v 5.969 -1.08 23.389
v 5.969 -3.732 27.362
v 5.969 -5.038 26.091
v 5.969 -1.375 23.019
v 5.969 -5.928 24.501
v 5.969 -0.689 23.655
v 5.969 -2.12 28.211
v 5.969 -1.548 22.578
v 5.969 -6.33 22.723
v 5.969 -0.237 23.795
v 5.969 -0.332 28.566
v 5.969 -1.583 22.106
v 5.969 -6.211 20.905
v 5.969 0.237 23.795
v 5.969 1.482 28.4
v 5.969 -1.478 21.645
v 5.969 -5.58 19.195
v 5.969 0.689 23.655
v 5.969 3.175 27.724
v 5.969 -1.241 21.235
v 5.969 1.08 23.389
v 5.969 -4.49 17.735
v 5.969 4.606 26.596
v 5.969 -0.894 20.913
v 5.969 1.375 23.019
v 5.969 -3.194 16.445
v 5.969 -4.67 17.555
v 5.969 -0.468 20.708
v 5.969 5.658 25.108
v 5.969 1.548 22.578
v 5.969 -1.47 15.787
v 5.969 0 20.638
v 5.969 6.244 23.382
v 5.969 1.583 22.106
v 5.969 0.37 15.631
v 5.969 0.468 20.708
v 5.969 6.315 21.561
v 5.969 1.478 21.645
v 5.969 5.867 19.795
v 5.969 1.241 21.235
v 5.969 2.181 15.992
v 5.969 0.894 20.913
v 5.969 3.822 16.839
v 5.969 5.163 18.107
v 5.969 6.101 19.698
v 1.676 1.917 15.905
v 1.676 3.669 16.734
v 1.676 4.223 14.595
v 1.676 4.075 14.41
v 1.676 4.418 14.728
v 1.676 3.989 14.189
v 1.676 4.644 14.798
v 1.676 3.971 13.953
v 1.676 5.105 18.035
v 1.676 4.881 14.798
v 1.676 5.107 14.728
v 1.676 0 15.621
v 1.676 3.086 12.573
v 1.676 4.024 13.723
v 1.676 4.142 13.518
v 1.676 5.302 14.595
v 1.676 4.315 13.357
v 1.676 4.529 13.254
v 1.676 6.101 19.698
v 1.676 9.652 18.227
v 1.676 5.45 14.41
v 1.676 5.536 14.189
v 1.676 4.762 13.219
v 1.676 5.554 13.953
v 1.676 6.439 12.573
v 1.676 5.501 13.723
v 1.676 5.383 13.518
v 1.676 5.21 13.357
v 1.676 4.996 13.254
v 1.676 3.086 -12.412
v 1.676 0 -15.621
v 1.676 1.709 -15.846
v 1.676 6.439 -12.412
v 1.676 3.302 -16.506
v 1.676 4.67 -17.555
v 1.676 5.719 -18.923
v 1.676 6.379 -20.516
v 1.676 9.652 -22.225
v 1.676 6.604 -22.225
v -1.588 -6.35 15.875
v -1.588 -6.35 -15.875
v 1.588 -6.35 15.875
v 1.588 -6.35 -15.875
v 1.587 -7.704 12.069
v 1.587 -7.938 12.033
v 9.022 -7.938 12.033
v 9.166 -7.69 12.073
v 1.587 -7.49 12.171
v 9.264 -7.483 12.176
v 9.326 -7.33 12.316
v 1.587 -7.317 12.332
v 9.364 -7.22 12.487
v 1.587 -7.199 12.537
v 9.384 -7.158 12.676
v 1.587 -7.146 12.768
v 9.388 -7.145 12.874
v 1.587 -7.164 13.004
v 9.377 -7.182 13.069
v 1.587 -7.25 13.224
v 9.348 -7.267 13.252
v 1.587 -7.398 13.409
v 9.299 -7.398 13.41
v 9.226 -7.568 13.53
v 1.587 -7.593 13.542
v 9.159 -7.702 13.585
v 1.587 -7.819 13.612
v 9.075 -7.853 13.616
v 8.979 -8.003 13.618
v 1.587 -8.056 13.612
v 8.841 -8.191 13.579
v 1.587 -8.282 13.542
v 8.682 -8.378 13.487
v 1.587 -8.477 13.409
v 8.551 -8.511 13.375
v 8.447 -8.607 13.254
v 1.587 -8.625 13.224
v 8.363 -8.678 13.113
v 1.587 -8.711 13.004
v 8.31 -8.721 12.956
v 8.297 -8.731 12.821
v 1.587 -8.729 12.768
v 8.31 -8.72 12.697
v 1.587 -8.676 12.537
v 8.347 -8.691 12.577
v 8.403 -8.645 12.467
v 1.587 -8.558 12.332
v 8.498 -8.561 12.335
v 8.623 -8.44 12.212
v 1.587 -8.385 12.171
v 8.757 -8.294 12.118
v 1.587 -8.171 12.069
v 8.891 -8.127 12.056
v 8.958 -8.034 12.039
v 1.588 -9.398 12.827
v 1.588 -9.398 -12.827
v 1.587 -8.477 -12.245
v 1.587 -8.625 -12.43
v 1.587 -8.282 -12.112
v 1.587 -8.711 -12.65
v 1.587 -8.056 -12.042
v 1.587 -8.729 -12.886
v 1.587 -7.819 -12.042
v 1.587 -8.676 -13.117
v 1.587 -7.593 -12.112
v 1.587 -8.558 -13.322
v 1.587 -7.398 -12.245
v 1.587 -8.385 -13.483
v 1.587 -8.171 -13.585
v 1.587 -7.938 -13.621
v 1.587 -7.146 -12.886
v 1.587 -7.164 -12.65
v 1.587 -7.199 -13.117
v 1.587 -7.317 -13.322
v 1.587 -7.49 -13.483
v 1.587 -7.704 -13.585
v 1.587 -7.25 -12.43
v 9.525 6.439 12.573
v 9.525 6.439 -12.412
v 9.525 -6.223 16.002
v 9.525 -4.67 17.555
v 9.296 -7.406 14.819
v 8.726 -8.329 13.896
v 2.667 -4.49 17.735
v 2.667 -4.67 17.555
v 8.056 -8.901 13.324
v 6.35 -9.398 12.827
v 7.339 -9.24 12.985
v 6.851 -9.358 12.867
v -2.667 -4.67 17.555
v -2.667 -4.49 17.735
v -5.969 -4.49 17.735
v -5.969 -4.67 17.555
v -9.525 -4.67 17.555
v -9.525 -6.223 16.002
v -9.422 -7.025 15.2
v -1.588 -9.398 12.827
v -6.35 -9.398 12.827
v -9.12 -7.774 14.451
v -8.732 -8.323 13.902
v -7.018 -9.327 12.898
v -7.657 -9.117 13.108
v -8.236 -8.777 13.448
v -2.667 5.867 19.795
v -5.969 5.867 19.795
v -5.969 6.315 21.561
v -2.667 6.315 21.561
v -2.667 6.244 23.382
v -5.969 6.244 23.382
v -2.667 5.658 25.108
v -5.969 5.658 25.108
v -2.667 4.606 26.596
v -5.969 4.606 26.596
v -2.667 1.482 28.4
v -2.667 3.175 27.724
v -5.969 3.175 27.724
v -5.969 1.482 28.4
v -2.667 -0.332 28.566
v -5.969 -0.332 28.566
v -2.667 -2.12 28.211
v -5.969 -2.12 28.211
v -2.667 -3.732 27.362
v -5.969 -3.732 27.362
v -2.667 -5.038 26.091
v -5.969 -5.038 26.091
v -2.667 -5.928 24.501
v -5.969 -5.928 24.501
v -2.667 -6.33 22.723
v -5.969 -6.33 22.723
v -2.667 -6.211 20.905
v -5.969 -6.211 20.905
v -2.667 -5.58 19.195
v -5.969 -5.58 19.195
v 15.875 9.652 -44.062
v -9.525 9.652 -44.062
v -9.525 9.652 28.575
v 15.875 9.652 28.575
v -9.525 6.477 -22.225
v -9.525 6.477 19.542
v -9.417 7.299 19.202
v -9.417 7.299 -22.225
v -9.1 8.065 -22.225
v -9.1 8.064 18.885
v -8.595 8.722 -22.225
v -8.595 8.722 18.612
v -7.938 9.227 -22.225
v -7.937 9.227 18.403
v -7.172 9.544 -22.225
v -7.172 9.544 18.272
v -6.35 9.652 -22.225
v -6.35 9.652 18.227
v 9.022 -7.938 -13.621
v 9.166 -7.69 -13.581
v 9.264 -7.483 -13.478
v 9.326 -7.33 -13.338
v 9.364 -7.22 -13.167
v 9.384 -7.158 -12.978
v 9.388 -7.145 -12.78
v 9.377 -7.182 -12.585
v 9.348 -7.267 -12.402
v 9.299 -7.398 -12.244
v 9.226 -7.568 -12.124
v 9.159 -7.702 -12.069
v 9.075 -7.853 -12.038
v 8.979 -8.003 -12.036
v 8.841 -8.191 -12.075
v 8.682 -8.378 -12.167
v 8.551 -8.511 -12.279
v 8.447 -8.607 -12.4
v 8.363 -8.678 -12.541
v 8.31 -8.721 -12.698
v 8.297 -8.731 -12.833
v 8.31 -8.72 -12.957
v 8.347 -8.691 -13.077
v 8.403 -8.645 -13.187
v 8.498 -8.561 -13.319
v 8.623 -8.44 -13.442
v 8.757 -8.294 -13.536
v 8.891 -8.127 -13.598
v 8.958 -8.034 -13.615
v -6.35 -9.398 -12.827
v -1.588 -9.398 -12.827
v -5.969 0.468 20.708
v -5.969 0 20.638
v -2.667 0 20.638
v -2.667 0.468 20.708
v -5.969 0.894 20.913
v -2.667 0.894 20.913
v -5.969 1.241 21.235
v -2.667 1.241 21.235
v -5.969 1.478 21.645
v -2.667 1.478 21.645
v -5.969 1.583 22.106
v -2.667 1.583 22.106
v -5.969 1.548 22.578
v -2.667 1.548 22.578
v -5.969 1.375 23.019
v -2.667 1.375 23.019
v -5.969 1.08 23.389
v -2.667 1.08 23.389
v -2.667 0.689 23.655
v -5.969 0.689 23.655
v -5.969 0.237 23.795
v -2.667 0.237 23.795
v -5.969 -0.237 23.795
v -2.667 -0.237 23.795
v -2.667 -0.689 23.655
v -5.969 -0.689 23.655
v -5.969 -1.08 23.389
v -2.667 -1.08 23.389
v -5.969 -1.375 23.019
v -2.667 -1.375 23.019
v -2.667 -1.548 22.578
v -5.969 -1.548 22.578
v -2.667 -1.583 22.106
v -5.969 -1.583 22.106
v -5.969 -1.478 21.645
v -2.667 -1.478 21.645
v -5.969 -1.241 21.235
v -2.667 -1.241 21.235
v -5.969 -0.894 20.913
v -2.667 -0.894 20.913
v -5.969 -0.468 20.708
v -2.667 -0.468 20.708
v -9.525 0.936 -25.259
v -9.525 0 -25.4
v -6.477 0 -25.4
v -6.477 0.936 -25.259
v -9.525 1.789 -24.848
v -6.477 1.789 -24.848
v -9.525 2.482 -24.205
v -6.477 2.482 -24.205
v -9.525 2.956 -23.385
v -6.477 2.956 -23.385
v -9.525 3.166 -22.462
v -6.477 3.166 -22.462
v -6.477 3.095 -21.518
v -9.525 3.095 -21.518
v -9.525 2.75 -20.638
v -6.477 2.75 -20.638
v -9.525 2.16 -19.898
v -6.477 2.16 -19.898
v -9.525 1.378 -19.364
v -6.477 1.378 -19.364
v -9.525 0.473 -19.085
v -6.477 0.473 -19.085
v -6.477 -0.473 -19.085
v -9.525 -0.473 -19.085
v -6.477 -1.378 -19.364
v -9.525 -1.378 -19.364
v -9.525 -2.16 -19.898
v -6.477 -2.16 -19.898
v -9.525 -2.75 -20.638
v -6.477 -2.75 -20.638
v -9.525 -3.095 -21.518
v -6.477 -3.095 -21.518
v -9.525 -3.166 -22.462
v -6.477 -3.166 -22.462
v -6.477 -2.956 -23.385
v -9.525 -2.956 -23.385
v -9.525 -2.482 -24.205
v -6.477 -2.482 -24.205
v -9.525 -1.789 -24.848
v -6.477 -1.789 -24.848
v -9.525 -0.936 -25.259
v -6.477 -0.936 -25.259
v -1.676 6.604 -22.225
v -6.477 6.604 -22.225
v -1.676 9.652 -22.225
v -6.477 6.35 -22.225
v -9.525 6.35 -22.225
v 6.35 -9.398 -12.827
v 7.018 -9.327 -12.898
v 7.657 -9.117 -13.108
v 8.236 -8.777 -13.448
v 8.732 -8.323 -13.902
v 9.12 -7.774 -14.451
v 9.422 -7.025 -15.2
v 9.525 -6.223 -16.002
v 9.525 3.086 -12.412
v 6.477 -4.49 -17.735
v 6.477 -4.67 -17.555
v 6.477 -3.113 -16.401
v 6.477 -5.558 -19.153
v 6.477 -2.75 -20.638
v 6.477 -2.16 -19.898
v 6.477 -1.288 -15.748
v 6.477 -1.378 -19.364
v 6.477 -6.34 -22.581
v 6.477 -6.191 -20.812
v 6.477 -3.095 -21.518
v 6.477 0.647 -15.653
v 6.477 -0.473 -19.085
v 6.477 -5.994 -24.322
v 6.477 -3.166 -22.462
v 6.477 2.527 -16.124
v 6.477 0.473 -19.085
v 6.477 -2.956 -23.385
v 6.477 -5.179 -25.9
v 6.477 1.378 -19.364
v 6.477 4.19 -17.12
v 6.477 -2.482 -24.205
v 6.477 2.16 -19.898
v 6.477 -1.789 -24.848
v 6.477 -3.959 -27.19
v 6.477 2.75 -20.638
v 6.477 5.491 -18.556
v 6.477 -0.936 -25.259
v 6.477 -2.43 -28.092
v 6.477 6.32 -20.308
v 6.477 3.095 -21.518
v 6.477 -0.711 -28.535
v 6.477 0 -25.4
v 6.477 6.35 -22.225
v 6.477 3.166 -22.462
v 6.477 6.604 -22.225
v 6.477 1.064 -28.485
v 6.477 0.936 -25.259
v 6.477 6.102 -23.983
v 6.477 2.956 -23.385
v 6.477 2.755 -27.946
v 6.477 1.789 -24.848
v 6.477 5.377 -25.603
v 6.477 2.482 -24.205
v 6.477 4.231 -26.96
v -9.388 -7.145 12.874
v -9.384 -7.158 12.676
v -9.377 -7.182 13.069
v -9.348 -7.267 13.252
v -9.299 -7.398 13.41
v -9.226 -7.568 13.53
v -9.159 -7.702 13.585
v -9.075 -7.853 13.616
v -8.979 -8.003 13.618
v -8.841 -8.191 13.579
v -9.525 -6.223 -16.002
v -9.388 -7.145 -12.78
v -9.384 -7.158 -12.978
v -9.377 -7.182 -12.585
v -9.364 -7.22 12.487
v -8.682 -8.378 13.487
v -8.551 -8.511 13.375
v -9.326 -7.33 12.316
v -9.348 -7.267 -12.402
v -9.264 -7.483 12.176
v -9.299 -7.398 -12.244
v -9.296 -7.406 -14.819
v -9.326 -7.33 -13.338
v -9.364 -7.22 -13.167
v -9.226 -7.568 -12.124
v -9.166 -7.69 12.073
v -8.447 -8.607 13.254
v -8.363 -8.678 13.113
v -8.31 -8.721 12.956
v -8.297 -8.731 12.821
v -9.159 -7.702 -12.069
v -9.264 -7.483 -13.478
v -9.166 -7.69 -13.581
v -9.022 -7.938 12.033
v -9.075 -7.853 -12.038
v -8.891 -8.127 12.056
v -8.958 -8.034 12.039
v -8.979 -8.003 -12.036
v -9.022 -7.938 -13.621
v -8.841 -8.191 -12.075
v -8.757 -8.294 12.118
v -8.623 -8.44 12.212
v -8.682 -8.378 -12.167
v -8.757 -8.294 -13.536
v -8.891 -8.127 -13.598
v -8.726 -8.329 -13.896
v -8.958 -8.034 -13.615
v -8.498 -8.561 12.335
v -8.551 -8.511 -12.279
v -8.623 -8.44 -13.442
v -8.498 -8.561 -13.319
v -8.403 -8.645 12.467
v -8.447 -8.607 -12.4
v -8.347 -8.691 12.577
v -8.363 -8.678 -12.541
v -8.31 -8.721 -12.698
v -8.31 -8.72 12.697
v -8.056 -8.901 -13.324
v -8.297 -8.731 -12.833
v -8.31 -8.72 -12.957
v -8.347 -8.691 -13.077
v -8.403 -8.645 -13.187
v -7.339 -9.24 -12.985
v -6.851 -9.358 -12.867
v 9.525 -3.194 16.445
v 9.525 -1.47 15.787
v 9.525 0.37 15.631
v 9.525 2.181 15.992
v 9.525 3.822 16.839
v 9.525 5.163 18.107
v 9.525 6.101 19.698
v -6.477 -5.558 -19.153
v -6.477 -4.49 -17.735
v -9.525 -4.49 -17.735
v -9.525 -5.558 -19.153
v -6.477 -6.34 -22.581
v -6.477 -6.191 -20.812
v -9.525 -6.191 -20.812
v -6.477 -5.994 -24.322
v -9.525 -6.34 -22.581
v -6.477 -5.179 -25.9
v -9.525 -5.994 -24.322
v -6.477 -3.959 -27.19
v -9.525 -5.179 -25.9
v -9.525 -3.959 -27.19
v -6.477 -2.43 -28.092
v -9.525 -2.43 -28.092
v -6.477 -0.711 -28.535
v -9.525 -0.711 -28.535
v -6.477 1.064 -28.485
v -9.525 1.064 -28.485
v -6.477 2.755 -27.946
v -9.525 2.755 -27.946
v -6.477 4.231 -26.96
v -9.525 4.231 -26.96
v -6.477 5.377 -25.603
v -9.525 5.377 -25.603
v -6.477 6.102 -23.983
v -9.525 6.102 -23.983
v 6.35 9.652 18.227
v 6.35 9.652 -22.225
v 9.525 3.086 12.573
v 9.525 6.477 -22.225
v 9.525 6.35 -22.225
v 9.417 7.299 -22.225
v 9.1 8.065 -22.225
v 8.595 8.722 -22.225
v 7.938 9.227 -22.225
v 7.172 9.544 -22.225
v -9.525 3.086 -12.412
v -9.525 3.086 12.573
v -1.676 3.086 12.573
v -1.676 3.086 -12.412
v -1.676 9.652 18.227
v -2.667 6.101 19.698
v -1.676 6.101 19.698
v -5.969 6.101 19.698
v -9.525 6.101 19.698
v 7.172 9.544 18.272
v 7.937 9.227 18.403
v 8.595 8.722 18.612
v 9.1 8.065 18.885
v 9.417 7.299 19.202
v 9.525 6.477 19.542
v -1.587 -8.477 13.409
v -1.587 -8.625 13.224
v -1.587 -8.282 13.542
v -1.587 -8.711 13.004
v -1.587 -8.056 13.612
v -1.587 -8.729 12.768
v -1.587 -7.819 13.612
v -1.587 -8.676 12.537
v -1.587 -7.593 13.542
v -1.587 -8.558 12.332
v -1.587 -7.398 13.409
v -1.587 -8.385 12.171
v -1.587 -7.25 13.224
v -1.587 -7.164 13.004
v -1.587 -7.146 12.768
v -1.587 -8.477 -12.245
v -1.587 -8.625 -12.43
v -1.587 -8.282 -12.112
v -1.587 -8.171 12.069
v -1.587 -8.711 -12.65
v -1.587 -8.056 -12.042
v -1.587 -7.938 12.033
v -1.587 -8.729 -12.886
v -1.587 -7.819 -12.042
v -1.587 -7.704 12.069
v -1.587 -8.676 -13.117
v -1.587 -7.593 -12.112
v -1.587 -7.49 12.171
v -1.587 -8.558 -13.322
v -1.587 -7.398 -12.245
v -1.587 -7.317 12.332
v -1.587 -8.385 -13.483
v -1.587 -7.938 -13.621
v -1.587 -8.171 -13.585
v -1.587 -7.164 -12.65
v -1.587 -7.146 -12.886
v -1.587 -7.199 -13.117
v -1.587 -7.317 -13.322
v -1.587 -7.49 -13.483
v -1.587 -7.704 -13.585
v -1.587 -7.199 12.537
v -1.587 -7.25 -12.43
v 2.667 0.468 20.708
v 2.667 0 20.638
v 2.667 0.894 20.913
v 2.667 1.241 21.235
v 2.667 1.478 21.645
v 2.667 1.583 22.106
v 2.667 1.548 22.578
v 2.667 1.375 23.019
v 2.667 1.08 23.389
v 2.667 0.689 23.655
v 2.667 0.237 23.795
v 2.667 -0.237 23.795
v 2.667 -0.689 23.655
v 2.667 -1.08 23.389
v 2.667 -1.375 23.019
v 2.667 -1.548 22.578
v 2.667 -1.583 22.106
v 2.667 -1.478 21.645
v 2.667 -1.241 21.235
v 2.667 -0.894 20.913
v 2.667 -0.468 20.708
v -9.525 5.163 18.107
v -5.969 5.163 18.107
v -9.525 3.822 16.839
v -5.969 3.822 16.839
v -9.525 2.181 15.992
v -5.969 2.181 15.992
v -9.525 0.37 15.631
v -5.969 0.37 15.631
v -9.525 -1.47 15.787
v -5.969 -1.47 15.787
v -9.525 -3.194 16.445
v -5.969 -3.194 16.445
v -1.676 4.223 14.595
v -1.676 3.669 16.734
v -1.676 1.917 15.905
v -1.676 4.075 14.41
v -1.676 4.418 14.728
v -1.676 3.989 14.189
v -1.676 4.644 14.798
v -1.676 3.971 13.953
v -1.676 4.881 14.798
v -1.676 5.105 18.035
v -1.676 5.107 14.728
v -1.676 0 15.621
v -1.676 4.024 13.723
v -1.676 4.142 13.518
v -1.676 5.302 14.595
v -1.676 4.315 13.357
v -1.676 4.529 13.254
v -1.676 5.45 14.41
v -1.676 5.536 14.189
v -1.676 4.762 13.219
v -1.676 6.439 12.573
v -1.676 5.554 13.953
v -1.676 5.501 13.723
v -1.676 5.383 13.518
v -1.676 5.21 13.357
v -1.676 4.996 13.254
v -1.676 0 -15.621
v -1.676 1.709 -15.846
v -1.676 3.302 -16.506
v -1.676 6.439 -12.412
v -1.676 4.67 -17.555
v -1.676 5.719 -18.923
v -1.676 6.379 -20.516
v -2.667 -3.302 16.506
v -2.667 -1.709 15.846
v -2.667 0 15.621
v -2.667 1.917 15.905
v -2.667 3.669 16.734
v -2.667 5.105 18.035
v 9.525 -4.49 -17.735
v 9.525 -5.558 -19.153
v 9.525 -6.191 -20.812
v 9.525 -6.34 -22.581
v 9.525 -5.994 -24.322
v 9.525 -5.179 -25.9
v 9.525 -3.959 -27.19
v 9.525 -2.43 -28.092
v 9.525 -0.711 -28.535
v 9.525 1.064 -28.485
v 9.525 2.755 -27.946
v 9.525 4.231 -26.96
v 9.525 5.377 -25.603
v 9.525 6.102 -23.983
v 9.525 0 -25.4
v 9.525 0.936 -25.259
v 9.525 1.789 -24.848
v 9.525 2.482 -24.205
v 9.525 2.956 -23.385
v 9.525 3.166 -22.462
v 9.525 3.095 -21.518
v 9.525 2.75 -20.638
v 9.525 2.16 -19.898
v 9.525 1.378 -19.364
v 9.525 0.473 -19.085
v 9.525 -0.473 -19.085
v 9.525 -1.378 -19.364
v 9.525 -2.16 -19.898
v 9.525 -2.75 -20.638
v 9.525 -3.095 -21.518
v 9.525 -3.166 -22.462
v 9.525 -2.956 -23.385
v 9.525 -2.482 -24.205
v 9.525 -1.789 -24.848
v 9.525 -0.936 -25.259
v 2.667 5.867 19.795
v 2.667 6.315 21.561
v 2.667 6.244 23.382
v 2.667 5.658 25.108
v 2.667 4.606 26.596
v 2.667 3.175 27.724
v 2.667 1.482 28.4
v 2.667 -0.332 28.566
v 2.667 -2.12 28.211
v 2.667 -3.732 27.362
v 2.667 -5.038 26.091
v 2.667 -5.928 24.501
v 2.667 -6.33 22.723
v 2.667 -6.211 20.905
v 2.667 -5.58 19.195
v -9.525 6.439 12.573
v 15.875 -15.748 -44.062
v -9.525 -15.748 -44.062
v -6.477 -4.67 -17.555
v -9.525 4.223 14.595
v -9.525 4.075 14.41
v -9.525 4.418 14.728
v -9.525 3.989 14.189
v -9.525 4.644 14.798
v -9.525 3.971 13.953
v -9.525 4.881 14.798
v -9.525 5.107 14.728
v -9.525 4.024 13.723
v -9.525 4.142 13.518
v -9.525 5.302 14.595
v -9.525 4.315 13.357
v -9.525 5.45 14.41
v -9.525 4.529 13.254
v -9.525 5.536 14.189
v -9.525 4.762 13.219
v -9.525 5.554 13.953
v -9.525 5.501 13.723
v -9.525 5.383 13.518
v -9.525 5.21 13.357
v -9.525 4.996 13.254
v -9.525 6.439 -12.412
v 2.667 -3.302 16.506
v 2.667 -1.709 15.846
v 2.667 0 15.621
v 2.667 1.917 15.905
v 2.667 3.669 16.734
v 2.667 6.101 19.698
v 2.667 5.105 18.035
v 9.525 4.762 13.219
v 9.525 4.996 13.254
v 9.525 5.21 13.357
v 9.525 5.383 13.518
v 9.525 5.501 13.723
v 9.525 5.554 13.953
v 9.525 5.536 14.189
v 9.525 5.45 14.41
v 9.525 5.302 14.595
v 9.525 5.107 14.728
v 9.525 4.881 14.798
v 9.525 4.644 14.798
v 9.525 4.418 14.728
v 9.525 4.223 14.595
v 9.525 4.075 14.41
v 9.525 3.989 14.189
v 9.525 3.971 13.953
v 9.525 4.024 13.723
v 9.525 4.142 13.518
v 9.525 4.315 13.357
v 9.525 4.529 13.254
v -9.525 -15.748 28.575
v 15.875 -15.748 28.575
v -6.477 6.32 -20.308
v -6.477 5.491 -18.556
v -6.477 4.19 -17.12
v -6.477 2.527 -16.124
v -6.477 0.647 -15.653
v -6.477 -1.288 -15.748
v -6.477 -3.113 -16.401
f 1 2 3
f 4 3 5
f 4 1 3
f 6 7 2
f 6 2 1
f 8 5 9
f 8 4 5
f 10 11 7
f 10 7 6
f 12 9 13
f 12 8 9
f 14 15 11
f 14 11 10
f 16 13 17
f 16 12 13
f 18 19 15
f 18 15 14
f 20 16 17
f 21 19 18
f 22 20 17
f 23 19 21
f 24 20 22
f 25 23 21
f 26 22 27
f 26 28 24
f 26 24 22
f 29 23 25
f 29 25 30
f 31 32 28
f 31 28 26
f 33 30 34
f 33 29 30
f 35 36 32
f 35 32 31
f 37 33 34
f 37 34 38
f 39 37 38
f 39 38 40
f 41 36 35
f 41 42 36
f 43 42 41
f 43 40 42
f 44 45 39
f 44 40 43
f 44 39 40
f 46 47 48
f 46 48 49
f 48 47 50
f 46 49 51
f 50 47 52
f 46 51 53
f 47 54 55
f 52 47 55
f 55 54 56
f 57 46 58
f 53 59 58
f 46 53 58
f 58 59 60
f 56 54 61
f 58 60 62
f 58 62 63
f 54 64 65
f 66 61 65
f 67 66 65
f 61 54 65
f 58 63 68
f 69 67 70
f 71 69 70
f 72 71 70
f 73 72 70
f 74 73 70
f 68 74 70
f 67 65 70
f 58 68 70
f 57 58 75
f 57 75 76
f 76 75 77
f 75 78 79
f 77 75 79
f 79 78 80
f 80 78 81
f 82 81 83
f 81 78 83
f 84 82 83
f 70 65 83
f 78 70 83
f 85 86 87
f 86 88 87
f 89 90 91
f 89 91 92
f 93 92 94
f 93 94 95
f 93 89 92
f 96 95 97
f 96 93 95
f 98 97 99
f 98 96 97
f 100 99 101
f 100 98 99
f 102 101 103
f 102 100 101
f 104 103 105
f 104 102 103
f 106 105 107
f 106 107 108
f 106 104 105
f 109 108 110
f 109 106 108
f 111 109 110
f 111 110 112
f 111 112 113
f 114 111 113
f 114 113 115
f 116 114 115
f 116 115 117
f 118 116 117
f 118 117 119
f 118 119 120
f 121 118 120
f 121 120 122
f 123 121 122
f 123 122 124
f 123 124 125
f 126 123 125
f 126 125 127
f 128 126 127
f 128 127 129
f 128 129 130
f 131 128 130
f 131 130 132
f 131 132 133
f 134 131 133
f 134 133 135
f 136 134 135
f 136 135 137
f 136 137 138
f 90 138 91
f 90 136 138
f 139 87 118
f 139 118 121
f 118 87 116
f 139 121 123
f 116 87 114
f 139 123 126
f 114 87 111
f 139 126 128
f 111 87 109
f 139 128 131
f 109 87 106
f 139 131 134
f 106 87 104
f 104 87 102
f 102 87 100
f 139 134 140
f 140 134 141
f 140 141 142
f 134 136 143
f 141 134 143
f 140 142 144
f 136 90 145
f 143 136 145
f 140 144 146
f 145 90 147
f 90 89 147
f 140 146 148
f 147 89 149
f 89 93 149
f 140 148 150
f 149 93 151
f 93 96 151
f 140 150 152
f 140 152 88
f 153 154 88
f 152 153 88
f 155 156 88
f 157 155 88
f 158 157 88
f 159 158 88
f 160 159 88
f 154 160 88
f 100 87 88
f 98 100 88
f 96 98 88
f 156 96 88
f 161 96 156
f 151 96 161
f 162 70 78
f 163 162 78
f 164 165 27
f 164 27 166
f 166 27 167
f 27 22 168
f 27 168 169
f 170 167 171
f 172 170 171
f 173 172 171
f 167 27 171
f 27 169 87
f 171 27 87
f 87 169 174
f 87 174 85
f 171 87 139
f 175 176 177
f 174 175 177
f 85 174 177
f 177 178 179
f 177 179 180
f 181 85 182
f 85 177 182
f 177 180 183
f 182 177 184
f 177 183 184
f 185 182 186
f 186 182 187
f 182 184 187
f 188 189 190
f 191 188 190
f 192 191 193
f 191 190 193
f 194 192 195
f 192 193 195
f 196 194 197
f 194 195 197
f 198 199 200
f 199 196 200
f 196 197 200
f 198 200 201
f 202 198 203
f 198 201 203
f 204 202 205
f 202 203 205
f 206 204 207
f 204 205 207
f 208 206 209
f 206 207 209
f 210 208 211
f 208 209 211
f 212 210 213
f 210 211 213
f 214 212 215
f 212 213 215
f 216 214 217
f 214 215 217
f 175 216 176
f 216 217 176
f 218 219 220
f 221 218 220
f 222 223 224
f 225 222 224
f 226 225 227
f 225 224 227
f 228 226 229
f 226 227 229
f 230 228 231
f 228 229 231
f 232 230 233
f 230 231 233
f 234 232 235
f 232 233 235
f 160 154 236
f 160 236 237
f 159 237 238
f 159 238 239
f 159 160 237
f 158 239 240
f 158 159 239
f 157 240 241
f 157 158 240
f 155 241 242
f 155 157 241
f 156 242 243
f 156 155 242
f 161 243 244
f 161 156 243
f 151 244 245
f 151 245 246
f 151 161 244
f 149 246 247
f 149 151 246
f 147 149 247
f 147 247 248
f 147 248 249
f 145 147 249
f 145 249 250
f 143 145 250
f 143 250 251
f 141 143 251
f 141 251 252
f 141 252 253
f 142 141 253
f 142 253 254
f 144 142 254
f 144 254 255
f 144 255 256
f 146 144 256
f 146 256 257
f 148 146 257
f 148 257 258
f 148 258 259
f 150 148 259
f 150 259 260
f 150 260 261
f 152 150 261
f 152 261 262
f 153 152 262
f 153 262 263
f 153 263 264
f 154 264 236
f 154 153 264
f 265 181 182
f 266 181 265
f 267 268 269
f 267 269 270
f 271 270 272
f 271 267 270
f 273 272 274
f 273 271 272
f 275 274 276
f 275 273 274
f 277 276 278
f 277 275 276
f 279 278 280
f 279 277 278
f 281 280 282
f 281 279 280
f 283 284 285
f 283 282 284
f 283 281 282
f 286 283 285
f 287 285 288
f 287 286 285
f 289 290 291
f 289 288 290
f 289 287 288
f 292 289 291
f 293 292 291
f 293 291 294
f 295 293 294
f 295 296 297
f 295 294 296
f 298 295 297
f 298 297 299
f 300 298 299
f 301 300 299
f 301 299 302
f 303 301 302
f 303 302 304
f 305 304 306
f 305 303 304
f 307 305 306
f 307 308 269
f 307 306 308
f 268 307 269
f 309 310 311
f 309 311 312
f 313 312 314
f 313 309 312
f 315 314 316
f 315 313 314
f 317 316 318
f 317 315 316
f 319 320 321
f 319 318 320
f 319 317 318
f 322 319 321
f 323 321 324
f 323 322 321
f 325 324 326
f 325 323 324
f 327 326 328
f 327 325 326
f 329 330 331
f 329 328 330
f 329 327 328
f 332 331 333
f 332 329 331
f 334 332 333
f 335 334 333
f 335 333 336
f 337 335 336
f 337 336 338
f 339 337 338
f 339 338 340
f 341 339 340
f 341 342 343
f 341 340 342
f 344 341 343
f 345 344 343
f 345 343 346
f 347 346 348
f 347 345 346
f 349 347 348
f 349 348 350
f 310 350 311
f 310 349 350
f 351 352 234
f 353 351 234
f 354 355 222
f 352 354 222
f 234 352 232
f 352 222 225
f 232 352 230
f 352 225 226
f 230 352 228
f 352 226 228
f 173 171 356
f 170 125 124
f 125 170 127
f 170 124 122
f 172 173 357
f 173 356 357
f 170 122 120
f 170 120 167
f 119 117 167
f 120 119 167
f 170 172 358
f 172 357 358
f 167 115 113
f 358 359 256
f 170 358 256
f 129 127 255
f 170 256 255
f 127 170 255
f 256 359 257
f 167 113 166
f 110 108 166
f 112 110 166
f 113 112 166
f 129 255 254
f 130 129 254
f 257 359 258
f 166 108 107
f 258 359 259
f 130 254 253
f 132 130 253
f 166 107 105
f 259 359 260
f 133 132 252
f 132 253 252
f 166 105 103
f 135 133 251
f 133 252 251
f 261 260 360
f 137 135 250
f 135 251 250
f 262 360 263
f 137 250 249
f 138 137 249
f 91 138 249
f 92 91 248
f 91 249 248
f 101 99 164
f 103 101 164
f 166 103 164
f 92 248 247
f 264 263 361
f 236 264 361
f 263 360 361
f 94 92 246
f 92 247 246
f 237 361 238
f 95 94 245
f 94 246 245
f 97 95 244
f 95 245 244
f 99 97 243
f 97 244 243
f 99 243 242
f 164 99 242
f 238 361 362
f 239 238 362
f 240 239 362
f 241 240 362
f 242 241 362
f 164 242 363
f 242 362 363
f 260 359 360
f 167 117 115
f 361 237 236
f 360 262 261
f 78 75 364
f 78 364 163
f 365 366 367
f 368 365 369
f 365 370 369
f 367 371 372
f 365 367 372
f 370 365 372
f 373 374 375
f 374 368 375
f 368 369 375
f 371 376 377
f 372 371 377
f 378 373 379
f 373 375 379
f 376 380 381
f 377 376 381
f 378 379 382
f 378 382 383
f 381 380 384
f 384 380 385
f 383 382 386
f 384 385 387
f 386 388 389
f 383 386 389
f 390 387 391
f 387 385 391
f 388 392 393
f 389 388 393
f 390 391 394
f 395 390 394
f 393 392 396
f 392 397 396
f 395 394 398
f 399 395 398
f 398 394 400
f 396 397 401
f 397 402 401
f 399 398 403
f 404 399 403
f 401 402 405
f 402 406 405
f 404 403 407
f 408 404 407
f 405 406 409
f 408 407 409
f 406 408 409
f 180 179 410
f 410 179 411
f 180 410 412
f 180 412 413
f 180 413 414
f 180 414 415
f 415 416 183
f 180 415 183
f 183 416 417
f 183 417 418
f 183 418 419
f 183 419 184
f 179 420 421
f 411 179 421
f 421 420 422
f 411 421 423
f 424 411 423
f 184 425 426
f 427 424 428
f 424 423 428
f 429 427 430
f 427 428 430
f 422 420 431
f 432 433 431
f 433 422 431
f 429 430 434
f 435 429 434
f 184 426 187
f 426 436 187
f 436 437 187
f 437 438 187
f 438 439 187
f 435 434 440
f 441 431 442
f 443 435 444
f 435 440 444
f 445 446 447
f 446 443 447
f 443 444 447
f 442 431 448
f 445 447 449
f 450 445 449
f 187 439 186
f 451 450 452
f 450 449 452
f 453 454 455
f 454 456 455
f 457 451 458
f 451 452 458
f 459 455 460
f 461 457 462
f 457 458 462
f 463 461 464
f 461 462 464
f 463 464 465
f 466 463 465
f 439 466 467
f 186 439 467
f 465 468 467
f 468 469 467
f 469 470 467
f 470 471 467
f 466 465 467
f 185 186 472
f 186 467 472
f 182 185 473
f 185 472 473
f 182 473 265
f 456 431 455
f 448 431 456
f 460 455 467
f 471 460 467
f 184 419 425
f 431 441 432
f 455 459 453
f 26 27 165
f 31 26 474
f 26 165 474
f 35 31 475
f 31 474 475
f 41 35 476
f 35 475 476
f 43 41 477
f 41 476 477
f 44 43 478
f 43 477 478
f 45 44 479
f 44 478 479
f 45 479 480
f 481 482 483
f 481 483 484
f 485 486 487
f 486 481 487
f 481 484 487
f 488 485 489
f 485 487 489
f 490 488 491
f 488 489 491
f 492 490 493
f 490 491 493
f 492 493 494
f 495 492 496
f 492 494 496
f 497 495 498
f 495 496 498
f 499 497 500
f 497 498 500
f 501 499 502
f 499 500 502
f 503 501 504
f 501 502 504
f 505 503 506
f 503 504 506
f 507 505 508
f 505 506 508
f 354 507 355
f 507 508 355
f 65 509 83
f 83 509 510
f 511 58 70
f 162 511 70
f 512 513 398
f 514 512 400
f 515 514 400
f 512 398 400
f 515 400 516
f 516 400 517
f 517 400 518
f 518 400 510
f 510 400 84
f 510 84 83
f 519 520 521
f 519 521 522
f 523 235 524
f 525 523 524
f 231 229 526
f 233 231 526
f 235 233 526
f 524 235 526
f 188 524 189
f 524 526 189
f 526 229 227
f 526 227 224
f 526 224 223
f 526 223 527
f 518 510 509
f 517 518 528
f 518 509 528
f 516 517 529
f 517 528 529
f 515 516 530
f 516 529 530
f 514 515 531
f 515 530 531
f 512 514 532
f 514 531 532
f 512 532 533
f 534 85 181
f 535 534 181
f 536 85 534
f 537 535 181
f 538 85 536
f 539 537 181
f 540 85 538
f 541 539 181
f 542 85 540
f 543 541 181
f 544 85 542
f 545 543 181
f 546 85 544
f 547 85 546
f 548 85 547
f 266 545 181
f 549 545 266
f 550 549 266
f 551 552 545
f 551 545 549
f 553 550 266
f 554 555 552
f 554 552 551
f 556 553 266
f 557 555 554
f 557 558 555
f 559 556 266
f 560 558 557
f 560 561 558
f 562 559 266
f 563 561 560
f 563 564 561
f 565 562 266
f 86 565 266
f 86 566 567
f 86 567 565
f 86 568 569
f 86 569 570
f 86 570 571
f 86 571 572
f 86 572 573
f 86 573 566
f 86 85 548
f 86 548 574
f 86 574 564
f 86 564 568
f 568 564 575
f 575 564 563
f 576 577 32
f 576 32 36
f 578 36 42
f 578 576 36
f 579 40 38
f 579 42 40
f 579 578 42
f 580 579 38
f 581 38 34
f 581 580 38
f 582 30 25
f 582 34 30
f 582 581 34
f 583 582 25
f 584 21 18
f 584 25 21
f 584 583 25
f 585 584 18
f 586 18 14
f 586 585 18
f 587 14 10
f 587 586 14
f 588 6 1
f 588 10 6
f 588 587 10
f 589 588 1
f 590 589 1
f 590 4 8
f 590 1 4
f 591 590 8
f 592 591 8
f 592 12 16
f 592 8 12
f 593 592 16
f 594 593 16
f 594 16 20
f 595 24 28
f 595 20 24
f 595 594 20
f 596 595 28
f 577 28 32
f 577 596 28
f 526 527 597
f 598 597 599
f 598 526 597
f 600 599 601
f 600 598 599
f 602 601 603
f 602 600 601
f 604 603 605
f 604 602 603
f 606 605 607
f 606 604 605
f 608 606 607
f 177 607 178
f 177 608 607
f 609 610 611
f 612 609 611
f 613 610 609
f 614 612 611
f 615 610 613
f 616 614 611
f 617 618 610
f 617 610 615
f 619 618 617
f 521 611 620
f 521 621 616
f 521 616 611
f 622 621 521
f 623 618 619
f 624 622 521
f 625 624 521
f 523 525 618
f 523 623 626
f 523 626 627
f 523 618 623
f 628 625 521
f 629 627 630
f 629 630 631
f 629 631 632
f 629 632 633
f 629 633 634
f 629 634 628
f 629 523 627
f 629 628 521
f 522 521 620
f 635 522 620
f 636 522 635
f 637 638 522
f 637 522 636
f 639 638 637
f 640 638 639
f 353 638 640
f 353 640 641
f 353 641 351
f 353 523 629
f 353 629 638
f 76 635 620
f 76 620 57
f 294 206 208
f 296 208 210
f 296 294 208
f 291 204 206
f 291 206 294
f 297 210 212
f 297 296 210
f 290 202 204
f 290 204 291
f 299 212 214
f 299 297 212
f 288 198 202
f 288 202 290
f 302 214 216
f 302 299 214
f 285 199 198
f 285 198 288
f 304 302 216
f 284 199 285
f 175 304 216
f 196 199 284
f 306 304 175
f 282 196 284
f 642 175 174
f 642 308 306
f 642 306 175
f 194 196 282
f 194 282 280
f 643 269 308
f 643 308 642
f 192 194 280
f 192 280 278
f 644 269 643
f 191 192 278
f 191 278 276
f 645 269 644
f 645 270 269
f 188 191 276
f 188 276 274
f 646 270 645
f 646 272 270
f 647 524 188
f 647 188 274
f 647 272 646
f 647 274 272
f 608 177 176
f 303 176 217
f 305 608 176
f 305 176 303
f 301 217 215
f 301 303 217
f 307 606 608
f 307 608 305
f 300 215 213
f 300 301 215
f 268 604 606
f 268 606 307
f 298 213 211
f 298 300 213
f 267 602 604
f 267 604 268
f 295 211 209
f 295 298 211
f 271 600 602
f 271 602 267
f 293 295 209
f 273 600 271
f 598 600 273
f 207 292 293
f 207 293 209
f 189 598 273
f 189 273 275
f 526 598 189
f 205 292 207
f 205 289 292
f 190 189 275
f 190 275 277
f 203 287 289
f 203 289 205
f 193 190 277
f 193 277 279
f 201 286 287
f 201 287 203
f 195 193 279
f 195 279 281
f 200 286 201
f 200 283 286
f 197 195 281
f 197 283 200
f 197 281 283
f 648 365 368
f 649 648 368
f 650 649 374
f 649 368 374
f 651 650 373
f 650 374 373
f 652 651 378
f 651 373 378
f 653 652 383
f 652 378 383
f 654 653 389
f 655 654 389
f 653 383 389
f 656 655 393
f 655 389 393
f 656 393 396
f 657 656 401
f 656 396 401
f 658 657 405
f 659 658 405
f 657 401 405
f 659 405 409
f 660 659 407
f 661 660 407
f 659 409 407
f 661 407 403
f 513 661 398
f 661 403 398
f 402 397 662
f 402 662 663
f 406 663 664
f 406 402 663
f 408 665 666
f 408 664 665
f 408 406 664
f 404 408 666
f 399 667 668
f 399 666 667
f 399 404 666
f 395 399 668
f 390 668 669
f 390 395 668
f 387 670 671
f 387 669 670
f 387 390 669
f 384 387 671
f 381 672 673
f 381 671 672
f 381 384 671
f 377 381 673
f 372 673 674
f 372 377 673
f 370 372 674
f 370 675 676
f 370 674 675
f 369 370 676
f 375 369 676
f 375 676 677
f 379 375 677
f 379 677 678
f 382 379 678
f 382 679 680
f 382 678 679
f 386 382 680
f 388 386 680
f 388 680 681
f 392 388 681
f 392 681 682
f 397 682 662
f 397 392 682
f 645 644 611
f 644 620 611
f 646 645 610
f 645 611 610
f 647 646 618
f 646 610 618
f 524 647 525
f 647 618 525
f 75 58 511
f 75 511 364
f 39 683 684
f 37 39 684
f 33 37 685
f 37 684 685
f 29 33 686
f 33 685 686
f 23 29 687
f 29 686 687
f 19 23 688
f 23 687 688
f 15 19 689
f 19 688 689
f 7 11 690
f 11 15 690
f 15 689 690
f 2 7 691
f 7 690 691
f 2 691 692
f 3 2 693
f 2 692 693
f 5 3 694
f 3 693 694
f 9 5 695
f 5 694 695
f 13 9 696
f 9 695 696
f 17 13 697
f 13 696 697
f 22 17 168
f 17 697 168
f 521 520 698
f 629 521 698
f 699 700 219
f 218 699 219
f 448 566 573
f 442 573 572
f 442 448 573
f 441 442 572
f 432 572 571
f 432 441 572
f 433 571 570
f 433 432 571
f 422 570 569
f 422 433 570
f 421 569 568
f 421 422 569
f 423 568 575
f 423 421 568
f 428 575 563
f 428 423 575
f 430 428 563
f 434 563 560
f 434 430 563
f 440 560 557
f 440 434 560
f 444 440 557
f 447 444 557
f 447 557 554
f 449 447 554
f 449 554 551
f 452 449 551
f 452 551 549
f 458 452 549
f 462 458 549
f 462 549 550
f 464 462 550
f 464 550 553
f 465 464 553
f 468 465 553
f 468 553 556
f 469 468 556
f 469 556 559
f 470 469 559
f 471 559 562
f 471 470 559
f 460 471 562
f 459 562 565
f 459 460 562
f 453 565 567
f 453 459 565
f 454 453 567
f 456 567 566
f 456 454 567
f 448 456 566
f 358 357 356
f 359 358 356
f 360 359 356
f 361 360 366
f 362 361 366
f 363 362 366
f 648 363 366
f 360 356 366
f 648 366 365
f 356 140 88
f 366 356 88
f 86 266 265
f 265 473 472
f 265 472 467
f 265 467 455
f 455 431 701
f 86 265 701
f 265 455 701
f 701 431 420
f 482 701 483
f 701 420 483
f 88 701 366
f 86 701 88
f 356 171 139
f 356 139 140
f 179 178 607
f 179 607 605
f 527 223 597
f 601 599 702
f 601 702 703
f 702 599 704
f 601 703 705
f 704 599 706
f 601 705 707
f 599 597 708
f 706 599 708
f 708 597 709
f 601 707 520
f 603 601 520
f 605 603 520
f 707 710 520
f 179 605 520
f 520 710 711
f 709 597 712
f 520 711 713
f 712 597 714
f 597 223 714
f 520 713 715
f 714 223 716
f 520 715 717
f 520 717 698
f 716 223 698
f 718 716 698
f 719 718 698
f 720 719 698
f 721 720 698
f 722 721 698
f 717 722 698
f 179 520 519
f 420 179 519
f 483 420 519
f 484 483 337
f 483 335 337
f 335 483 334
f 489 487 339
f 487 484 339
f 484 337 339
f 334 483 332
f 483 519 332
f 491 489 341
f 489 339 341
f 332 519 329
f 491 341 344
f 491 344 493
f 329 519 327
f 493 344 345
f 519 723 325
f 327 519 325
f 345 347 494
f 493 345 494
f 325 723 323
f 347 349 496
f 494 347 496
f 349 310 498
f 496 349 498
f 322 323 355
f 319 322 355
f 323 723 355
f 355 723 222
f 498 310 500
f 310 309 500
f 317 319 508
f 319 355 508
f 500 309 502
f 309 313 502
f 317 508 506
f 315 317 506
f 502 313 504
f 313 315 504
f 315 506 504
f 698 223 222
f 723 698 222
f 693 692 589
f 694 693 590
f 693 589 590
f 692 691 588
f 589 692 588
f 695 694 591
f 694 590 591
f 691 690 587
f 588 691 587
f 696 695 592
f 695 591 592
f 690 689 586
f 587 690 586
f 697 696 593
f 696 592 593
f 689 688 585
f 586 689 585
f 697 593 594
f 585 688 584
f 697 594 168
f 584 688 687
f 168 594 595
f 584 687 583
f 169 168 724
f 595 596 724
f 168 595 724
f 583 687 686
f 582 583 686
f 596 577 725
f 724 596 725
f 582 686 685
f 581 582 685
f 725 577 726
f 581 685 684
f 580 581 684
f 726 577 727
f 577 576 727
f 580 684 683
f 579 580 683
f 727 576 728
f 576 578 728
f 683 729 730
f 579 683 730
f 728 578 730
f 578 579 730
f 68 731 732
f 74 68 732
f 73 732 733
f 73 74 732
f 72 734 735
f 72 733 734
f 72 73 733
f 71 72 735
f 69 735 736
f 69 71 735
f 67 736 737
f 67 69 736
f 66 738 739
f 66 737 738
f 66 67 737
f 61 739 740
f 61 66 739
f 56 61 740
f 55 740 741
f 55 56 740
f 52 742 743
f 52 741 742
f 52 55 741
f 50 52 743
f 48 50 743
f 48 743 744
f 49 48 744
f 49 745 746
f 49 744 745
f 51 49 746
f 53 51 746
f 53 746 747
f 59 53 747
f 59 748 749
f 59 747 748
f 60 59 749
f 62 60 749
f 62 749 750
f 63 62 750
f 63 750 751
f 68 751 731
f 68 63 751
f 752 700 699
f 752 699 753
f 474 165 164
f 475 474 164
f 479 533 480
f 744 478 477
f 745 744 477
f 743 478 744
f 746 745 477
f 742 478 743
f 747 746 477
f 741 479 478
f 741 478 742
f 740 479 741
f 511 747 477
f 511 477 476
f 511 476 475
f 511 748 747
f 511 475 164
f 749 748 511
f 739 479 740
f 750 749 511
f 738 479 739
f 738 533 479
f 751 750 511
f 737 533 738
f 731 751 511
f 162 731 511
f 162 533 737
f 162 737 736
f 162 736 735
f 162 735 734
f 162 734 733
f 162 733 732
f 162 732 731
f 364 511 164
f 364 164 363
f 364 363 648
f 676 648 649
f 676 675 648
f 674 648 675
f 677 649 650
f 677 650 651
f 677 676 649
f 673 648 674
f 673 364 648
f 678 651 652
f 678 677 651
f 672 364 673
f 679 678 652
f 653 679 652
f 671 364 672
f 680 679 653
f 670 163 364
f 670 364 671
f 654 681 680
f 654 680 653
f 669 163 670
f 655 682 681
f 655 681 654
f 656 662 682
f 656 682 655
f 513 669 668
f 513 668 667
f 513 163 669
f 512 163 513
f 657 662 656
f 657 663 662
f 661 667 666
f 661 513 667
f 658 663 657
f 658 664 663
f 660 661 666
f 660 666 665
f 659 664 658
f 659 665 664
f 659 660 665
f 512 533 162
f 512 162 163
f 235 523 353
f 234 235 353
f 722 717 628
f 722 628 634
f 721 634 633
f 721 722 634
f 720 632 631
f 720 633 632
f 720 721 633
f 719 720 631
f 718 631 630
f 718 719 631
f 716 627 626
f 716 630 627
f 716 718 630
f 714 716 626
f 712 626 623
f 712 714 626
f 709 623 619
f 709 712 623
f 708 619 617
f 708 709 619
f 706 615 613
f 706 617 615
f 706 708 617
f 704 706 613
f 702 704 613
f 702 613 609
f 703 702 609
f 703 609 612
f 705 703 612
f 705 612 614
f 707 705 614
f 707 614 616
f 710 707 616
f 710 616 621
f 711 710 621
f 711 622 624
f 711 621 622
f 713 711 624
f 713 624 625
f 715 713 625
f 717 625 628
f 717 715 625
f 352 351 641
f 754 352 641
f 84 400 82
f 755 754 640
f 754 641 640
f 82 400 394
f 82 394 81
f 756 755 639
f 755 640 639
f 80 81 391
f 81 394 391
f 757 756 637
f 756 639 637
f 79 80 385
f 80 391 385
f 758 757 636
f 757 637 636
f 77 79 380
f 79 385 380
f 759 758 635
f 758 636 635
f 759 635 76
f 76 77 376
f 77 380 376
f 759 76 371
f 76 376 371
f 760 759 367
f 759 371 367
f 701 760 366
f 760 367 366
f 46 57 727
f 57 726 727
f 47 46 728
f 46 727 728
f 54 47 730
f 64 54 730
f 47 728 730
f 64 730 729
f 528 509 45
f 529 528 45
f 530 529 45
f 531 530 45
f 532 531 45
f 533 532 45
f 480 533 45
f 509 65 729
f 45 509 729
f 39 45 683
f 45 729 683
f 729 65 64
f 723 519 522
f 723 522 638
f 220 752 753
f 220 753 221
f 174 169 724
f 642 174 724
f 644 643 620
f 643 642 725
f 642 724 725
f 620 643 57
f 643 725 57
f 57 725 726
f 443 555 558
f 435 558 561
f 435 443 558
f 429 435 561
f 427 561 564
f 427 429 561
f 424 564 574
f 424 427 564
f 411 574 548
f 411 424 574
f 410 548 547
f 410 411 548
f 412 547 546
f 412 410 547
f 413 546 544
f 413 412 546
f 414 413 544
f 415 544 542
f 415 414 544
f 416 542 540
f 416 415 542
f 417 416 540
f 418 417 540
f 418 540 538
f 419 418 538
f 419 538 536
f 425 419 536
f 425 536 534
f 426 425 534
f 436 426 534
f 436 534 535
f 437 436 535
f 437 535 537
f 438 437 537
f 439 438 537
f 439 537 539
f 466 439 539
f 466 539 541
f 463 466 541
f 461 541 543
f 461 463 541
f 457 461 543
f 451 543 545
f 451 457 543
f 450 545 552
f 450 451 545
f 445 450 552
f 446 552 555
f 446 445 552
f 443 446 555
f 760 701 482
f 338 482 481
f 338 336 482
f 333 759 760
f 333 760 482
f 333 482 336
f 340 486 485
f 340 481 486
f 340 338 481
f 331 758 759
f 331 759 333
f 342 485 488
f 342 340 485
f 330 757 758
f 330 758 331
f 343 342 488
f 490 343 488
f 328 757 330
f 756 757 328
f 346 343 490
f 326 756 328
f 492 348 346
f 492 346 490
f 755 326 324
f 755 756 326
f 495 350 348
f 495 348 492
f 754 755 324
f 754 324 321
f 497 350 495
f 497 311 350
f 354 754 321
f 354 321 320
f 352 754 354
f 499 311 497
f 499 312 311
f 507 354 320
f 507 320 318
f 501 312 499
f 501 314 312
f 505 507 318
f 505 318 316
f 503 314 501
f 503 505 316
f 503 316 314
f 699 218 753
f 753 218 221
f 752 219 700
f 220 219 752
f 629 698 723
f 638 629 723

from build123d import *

# Parameters (mm, degrees)
SKETCH1_W                = 57.15
SKETCH1_H                = 19.05
BOSS_EXTRUDE1_DEPTH      = 9.525
CUT_EXTRUDE3_DEPTH       = 32.629374859
CUT_EXTRUDE3_DEPTH_BACK  = 32.629374859
SKETCH2_OUTSIDE_W        = 71.786
SKETCH2_OUTSIDE_H        = 33.686
SKETCH7_R                = 6.604
CUT_EXTRUDE6_DEPTH       = 6.477
SKETCH11_R               = 6.604
CUT_EXTRUDE10_DEPTH      = 1.6764
SKETCH8_R                = 6.604
CUT_EXTRUDE7_DEPTH       = 3.556
CUT_EXTRUDE8_START       = -3.556
SKETCH9_R                = 6.604
CUT_EXTRUDE8_DEPTH       = 3.556
CUT_EXTRUDE9_DEPTH       = 32.629374859
CUT_EXTRUDE9_DEPTH_BACK  = 32.629374859
SKETCH10_R               = 1.5875
SKETCH10_R_2             = 3.175
CUT_EXTRUDE11_DEPTH      = 32.629374859
CUT_EXTRUDE11_DEPTH_BACK = 32.629374859
SKETCH12_W               = 3.3528
SKETCH12_H               = 6.477
CUT_EXTRUDE12_DEPTH      = 32.629374859
CUT_EXTRUDE12_DEPTH_BACK = 32.629374859
SKETCH13_R               = 0.79375
SKETCH13_W               = 24.984827435
SKETCH13_H               = 3.3528
CUT_EXTRUDE13_DEPTH      = 1.5875
CUT_EXTRUDE14_DEPTH      = 32.629374859
CUT_EXTRUDE14_DEPTH_BACK = 32.629374859
SKETCH16_R               = 0.79375
FILLET1_R                = 3.175
CUT_EXTRUDE15_DEPTH      = 32.62937489
CUT_EXTRUDE15_DEPTH_BACK = 32.62937489
SKETCH18_W               = 3.3528
SKETCH18_H               = 3.175
SKETCH19_R               = 6.604
CUT_EXTRUDE16_DEPTH      = 2.667
SKETCH20_W               = 72.636985126
SKETCH20_H               = 25.4
BOSS_EXTRUDE2_DEPTH      = 25.4


with BuildPart() as part:
    # Sketch1 → Boss-Extrude1 (new, symmetric)
    with BuildSketch(Plane(origin=(0, 0, 0), x_dir=(0, 0, -1), z_dir=(1, 0, 0))):
        with Locations((0, 0.127)):
            Rectangle(SKETCH1_W, SKETCH1_H)
    extrude(amount=BOSS_EXTRUDE1_DEPTH, both=True)

    # Sketch2 outside → Cut-Extrude3 (cut, two sides: drawn at the far end of the back side and taken through both)
    with BuildSketch(Plane(origin=(0, 0, 0), x_dir=(0, 0, -1), z_dir=(1, 0, 0)).offset(-CUT_EXTRUDE3_DEPTH_BACK)):
        with Locations((0, 0.127)):
            Rectangle(SKETCH2_OUTSIDE_W, SKETCH2_OUTSIDE_H)
        with BuildLine():
            Line((-17.734871939, -4.490128061), (-12.827, -9.398))
            Line((-12.827, -9.398), (12.827, -9.398))
            Line((12.827, -9.398), (17.734871939, -4.490128061))
            ThreePointArc((17.734871939, -4.490128061), (28.091635031, -2.430039796), (22.225, 6.35))
            Line((22.225, 6.35), (22.225, 9.652))
            Line((22.225, 9.652), (-18.227010696, 9.652))
            Line((-18.227010696, 9.652), (-19.794960204, 5.866635031))
            ThreePointArc((-19.794960204, 5.866635031), (-28.452986531, -1.238823545), (-17.734871939, -4.490128061))
        make_face(mode=Mode.SUBTRACT)
    extrude(amount=CUT_EXTRUDE3_DEPTH + CUT_EXTRUDE3_DEPTH_BACK, mode=Mode.SUBTRACT)

    # Sketch7 → Cut-Extrude6 (cut, symmetric)
    with BuildSketch(Plane(origin=(0, 0, 0), x_dir=(0, 0, -1), z_dir=(1, 0, 0))):
        with Locations((22.225, 0)):
            Circle(SKETCH7_R)
    extrude(amount=CUT_EXTRUDE6_DEPTH, both=True, mode=Mode.SUBTRACT)

    # Sketch11 → Cut-Extrude10 (cut, symmetric)
    with BuildSketch(Plane(origin=(0, 0, 0), x_dir=(0, 0, -1), z_dir=(1, 0, 0))):
        with Locations((-22.225, 0)):
            Circle(SKETCH11_R)
    extrude(amount=CUT_EXTRUDE10_DEPTH, both=True, mode=Mode.SUBTRACT)

    # Sketch8 → Cut-Extrude7 (cut)
    with BuildSketch(Plane(origin=(9.525, 0, 0), x_dir=(0, 0, -1), z_dir=(1, 0, 0))):
        with Locations((-22.225, 0)):
            Circle(SKETCH8_R)
    extrude(amount=-CUT_EXTRUDE7_DEPTH, mode=Mode.SUBTRACT)

    # Sketch9 → Cut-Extrude8 (cut)
    with BuildSketch(Plane.ZY.offset(9.525).offset(CUT_EXTRUDE8_START)):
        with Locations((22.225, 0)):
            Circle(SKETCH9_R)
    extrude(amount=CUT_EXTRUDE8_DEPTH, mode=Mode.SUBTRACT)

    # Sketch10 → Cut-Extrude9 (cut, two sides: drawn at the far end of the back side and taken through both)
    with BuildSketch(Plane(origin=(0, 0, 0), x_dir=(0, 0, -1), z_dir=(1, 0, 0)).offset(-CUT_EXTRUDE9_DEPTH_BACK)):
        with Locations((-22.225, 0)):
            Circle(SKETCH10_R)
        with Locations((22.225, 0)):
            Circle(SKETCH10_R_2)
    extrude(amount=CUT_EXTRUDE9_DEPTH + CUT_EXTRUDE9_DEPTH_BACK, mode=Mode.SUBTRACT)

    # Sketch12 → Cut-Extrude11 (cut, two sides: drawn at the far end of the back side and taken through both)
    with BuildSketch(Plane.XY.offset(-CUT_EXTRUDE11_DEPTH_BACK)):
        with Locations((0, 6.4135)):
            Rectangle(SKETCH12_W, SKETCH12_H)
    extrude(amount=CUT_EXTRUDE11_DEPTH + CUT_EXTRUDE11_DEPTH_BACK, mode=Mode.SUBTRACT)

    # Sketch13 → Cut-Extrude12 (cut, two sides: drawn at the far end of the back side and taken through both)
    with BuildSketch(Plane(origin=(0, 0, 0), x_dir=(0, 0, -1), z_dir=(1, 0, 0)).offset(-CUT_EXTRUDE12_DEPTH_BACK)):
        with Locations((-14.01279023, 4.7625)):
            Circle(SKETCH13_R)
        with Locations((-0.080586282, 4.7625)):
            Rectangle(SKETCH13_W, SKETCH13_H)
    extrude(amount=CUT_EXTRUDE12_DEPTH + CUT_EXTRUDE12_DEPTH_BACK, mode=Mode.SUBTRACT)

    # Sketch14 → Cut-Extrude13 (cut, symmetric)
    with BuildSketch(Plane(origin=(0, 0, 0), x_dir=(0, 0, -1), z_dir=(1, 0, 0))):
        Polygon((-15.875, -6.35), (-12.827, -9.398), (12.827, -9.398), (15.875, -6.35), align=None)
    extrude(amount=CUT_EXTRUDE13_DEPTH, both=True, mode=Mode.SUBTRACT)

    # Sketch16 → Cut-Extrude14 (cut, two sides: drawn at the far end of the back side and taken through both)
    with BuildSketch(Plane(origin=(0, 0, 0), x_dir=(0, 0, -1), z_dir=(1, 0, 0)).offset(-CUT_EXTRUDE14_DEPTH_BACK)):
        with Locations((-12.827, -7.9375)):
            Circle(SKETCH16_R)
        with Locations((12.827, -7.9375)):
            Circle(SKETCH16_R)
    extrude(amount=CUT_EXTRUDE14_DEPTH + CUT_EXTRUDE14_DEPTH_BACK, mode=Mode.SUBTRACT)

    # Fillet1
    # the kernel refuses this fillet: 3.175 mm, written as the material it takes off along each edge
    with BuildSketch(Plane(origin=(-9.525, 9.652, 26.164510696), x_dir=(1, 0, 0), z_dir=(0, 0, -1)), Plane(origin=(9.525, 9.652, 26.164510696), x_dir=(0, -1, 0), z_dir=(0, 0, -1))) as fillet1_piece_1:
        with BuildLine():
            CenterArc((FILLET1_R, FILLET1_R), FILLET1_R, 180, 90)
            Line((0, FILLET1_R), (0, 0))
            Line((0, 0), (FILLET1_R, 0))
        make_face()
    extrude(amount=56.327010696, mode=Mode.SUBTRACT)
    with BuildSketch(Plane(origin=(-9.525, -9.398, -20.7645), x_dir=(0, 1, 0), z_dir=(0, 0, 1)), Plane(origin=(9.525, -9.398, -20.7645), x_dir=(-1, 0, 0), z_dir=(0, 0, 1))) as fillet1_piece_2:
        with BuildLine():
            CenterArc((FILLET1_R, -FILLET1_R), FILLET1_R, 90, 90)
            Line((0, -FILLET1_R), (0, 0))
            Line((0, 0), (FILLET1_R, 0))
        make_face()
    extrude(amount=41.529, mode=Mode.SUBTRACT)

    # Sketch18 → Cut-Extrude15 (cut, two sides: drawn at the far end of the back side and taken through both)
    with BuildSketch(Plane.XY.offset(-CUT_EXTRUDE15_DEPTH_BACK)):
        with Locations((0, 1.5875)):
            Rectangle(SKETCH18_W, SKETCH18_H)
    extrude(amount=CUT_EXTRUDE15_DEPTH + CUT_EXTRUDE15_DEPTH_BACK, mode=Mode.SUBTRACT)

    # Sketch19 → Cut-Extrude16 (cut, symmetric)
    with BuildSketch(Plane(origin=(0, 0, 0), x_dir=(0, 0, -1), z_dir=(1, 0, 0))):
        with Locations((-22.225, 0)):
            Circle(SKETCH19_R)
    extrude(amount=CUT_EXTRUDE16_DEPTH, both=True, mode=Mode.SUBTRACT)


with BuildPart() as body_2:
    # Sketch20 → Boss-Extrude2 (new body)
    with BuildSketch(Plane.ZY.offset(9.525)):
        with Locations((-7.743492563, -3.048)):
            Rectangle(SKETCH20_W, SKETCH20_H)
    extrude(amount=-BOSS_EXTRUDE2_DEPTH)


solid = Compound([part.part, body_2.part])
